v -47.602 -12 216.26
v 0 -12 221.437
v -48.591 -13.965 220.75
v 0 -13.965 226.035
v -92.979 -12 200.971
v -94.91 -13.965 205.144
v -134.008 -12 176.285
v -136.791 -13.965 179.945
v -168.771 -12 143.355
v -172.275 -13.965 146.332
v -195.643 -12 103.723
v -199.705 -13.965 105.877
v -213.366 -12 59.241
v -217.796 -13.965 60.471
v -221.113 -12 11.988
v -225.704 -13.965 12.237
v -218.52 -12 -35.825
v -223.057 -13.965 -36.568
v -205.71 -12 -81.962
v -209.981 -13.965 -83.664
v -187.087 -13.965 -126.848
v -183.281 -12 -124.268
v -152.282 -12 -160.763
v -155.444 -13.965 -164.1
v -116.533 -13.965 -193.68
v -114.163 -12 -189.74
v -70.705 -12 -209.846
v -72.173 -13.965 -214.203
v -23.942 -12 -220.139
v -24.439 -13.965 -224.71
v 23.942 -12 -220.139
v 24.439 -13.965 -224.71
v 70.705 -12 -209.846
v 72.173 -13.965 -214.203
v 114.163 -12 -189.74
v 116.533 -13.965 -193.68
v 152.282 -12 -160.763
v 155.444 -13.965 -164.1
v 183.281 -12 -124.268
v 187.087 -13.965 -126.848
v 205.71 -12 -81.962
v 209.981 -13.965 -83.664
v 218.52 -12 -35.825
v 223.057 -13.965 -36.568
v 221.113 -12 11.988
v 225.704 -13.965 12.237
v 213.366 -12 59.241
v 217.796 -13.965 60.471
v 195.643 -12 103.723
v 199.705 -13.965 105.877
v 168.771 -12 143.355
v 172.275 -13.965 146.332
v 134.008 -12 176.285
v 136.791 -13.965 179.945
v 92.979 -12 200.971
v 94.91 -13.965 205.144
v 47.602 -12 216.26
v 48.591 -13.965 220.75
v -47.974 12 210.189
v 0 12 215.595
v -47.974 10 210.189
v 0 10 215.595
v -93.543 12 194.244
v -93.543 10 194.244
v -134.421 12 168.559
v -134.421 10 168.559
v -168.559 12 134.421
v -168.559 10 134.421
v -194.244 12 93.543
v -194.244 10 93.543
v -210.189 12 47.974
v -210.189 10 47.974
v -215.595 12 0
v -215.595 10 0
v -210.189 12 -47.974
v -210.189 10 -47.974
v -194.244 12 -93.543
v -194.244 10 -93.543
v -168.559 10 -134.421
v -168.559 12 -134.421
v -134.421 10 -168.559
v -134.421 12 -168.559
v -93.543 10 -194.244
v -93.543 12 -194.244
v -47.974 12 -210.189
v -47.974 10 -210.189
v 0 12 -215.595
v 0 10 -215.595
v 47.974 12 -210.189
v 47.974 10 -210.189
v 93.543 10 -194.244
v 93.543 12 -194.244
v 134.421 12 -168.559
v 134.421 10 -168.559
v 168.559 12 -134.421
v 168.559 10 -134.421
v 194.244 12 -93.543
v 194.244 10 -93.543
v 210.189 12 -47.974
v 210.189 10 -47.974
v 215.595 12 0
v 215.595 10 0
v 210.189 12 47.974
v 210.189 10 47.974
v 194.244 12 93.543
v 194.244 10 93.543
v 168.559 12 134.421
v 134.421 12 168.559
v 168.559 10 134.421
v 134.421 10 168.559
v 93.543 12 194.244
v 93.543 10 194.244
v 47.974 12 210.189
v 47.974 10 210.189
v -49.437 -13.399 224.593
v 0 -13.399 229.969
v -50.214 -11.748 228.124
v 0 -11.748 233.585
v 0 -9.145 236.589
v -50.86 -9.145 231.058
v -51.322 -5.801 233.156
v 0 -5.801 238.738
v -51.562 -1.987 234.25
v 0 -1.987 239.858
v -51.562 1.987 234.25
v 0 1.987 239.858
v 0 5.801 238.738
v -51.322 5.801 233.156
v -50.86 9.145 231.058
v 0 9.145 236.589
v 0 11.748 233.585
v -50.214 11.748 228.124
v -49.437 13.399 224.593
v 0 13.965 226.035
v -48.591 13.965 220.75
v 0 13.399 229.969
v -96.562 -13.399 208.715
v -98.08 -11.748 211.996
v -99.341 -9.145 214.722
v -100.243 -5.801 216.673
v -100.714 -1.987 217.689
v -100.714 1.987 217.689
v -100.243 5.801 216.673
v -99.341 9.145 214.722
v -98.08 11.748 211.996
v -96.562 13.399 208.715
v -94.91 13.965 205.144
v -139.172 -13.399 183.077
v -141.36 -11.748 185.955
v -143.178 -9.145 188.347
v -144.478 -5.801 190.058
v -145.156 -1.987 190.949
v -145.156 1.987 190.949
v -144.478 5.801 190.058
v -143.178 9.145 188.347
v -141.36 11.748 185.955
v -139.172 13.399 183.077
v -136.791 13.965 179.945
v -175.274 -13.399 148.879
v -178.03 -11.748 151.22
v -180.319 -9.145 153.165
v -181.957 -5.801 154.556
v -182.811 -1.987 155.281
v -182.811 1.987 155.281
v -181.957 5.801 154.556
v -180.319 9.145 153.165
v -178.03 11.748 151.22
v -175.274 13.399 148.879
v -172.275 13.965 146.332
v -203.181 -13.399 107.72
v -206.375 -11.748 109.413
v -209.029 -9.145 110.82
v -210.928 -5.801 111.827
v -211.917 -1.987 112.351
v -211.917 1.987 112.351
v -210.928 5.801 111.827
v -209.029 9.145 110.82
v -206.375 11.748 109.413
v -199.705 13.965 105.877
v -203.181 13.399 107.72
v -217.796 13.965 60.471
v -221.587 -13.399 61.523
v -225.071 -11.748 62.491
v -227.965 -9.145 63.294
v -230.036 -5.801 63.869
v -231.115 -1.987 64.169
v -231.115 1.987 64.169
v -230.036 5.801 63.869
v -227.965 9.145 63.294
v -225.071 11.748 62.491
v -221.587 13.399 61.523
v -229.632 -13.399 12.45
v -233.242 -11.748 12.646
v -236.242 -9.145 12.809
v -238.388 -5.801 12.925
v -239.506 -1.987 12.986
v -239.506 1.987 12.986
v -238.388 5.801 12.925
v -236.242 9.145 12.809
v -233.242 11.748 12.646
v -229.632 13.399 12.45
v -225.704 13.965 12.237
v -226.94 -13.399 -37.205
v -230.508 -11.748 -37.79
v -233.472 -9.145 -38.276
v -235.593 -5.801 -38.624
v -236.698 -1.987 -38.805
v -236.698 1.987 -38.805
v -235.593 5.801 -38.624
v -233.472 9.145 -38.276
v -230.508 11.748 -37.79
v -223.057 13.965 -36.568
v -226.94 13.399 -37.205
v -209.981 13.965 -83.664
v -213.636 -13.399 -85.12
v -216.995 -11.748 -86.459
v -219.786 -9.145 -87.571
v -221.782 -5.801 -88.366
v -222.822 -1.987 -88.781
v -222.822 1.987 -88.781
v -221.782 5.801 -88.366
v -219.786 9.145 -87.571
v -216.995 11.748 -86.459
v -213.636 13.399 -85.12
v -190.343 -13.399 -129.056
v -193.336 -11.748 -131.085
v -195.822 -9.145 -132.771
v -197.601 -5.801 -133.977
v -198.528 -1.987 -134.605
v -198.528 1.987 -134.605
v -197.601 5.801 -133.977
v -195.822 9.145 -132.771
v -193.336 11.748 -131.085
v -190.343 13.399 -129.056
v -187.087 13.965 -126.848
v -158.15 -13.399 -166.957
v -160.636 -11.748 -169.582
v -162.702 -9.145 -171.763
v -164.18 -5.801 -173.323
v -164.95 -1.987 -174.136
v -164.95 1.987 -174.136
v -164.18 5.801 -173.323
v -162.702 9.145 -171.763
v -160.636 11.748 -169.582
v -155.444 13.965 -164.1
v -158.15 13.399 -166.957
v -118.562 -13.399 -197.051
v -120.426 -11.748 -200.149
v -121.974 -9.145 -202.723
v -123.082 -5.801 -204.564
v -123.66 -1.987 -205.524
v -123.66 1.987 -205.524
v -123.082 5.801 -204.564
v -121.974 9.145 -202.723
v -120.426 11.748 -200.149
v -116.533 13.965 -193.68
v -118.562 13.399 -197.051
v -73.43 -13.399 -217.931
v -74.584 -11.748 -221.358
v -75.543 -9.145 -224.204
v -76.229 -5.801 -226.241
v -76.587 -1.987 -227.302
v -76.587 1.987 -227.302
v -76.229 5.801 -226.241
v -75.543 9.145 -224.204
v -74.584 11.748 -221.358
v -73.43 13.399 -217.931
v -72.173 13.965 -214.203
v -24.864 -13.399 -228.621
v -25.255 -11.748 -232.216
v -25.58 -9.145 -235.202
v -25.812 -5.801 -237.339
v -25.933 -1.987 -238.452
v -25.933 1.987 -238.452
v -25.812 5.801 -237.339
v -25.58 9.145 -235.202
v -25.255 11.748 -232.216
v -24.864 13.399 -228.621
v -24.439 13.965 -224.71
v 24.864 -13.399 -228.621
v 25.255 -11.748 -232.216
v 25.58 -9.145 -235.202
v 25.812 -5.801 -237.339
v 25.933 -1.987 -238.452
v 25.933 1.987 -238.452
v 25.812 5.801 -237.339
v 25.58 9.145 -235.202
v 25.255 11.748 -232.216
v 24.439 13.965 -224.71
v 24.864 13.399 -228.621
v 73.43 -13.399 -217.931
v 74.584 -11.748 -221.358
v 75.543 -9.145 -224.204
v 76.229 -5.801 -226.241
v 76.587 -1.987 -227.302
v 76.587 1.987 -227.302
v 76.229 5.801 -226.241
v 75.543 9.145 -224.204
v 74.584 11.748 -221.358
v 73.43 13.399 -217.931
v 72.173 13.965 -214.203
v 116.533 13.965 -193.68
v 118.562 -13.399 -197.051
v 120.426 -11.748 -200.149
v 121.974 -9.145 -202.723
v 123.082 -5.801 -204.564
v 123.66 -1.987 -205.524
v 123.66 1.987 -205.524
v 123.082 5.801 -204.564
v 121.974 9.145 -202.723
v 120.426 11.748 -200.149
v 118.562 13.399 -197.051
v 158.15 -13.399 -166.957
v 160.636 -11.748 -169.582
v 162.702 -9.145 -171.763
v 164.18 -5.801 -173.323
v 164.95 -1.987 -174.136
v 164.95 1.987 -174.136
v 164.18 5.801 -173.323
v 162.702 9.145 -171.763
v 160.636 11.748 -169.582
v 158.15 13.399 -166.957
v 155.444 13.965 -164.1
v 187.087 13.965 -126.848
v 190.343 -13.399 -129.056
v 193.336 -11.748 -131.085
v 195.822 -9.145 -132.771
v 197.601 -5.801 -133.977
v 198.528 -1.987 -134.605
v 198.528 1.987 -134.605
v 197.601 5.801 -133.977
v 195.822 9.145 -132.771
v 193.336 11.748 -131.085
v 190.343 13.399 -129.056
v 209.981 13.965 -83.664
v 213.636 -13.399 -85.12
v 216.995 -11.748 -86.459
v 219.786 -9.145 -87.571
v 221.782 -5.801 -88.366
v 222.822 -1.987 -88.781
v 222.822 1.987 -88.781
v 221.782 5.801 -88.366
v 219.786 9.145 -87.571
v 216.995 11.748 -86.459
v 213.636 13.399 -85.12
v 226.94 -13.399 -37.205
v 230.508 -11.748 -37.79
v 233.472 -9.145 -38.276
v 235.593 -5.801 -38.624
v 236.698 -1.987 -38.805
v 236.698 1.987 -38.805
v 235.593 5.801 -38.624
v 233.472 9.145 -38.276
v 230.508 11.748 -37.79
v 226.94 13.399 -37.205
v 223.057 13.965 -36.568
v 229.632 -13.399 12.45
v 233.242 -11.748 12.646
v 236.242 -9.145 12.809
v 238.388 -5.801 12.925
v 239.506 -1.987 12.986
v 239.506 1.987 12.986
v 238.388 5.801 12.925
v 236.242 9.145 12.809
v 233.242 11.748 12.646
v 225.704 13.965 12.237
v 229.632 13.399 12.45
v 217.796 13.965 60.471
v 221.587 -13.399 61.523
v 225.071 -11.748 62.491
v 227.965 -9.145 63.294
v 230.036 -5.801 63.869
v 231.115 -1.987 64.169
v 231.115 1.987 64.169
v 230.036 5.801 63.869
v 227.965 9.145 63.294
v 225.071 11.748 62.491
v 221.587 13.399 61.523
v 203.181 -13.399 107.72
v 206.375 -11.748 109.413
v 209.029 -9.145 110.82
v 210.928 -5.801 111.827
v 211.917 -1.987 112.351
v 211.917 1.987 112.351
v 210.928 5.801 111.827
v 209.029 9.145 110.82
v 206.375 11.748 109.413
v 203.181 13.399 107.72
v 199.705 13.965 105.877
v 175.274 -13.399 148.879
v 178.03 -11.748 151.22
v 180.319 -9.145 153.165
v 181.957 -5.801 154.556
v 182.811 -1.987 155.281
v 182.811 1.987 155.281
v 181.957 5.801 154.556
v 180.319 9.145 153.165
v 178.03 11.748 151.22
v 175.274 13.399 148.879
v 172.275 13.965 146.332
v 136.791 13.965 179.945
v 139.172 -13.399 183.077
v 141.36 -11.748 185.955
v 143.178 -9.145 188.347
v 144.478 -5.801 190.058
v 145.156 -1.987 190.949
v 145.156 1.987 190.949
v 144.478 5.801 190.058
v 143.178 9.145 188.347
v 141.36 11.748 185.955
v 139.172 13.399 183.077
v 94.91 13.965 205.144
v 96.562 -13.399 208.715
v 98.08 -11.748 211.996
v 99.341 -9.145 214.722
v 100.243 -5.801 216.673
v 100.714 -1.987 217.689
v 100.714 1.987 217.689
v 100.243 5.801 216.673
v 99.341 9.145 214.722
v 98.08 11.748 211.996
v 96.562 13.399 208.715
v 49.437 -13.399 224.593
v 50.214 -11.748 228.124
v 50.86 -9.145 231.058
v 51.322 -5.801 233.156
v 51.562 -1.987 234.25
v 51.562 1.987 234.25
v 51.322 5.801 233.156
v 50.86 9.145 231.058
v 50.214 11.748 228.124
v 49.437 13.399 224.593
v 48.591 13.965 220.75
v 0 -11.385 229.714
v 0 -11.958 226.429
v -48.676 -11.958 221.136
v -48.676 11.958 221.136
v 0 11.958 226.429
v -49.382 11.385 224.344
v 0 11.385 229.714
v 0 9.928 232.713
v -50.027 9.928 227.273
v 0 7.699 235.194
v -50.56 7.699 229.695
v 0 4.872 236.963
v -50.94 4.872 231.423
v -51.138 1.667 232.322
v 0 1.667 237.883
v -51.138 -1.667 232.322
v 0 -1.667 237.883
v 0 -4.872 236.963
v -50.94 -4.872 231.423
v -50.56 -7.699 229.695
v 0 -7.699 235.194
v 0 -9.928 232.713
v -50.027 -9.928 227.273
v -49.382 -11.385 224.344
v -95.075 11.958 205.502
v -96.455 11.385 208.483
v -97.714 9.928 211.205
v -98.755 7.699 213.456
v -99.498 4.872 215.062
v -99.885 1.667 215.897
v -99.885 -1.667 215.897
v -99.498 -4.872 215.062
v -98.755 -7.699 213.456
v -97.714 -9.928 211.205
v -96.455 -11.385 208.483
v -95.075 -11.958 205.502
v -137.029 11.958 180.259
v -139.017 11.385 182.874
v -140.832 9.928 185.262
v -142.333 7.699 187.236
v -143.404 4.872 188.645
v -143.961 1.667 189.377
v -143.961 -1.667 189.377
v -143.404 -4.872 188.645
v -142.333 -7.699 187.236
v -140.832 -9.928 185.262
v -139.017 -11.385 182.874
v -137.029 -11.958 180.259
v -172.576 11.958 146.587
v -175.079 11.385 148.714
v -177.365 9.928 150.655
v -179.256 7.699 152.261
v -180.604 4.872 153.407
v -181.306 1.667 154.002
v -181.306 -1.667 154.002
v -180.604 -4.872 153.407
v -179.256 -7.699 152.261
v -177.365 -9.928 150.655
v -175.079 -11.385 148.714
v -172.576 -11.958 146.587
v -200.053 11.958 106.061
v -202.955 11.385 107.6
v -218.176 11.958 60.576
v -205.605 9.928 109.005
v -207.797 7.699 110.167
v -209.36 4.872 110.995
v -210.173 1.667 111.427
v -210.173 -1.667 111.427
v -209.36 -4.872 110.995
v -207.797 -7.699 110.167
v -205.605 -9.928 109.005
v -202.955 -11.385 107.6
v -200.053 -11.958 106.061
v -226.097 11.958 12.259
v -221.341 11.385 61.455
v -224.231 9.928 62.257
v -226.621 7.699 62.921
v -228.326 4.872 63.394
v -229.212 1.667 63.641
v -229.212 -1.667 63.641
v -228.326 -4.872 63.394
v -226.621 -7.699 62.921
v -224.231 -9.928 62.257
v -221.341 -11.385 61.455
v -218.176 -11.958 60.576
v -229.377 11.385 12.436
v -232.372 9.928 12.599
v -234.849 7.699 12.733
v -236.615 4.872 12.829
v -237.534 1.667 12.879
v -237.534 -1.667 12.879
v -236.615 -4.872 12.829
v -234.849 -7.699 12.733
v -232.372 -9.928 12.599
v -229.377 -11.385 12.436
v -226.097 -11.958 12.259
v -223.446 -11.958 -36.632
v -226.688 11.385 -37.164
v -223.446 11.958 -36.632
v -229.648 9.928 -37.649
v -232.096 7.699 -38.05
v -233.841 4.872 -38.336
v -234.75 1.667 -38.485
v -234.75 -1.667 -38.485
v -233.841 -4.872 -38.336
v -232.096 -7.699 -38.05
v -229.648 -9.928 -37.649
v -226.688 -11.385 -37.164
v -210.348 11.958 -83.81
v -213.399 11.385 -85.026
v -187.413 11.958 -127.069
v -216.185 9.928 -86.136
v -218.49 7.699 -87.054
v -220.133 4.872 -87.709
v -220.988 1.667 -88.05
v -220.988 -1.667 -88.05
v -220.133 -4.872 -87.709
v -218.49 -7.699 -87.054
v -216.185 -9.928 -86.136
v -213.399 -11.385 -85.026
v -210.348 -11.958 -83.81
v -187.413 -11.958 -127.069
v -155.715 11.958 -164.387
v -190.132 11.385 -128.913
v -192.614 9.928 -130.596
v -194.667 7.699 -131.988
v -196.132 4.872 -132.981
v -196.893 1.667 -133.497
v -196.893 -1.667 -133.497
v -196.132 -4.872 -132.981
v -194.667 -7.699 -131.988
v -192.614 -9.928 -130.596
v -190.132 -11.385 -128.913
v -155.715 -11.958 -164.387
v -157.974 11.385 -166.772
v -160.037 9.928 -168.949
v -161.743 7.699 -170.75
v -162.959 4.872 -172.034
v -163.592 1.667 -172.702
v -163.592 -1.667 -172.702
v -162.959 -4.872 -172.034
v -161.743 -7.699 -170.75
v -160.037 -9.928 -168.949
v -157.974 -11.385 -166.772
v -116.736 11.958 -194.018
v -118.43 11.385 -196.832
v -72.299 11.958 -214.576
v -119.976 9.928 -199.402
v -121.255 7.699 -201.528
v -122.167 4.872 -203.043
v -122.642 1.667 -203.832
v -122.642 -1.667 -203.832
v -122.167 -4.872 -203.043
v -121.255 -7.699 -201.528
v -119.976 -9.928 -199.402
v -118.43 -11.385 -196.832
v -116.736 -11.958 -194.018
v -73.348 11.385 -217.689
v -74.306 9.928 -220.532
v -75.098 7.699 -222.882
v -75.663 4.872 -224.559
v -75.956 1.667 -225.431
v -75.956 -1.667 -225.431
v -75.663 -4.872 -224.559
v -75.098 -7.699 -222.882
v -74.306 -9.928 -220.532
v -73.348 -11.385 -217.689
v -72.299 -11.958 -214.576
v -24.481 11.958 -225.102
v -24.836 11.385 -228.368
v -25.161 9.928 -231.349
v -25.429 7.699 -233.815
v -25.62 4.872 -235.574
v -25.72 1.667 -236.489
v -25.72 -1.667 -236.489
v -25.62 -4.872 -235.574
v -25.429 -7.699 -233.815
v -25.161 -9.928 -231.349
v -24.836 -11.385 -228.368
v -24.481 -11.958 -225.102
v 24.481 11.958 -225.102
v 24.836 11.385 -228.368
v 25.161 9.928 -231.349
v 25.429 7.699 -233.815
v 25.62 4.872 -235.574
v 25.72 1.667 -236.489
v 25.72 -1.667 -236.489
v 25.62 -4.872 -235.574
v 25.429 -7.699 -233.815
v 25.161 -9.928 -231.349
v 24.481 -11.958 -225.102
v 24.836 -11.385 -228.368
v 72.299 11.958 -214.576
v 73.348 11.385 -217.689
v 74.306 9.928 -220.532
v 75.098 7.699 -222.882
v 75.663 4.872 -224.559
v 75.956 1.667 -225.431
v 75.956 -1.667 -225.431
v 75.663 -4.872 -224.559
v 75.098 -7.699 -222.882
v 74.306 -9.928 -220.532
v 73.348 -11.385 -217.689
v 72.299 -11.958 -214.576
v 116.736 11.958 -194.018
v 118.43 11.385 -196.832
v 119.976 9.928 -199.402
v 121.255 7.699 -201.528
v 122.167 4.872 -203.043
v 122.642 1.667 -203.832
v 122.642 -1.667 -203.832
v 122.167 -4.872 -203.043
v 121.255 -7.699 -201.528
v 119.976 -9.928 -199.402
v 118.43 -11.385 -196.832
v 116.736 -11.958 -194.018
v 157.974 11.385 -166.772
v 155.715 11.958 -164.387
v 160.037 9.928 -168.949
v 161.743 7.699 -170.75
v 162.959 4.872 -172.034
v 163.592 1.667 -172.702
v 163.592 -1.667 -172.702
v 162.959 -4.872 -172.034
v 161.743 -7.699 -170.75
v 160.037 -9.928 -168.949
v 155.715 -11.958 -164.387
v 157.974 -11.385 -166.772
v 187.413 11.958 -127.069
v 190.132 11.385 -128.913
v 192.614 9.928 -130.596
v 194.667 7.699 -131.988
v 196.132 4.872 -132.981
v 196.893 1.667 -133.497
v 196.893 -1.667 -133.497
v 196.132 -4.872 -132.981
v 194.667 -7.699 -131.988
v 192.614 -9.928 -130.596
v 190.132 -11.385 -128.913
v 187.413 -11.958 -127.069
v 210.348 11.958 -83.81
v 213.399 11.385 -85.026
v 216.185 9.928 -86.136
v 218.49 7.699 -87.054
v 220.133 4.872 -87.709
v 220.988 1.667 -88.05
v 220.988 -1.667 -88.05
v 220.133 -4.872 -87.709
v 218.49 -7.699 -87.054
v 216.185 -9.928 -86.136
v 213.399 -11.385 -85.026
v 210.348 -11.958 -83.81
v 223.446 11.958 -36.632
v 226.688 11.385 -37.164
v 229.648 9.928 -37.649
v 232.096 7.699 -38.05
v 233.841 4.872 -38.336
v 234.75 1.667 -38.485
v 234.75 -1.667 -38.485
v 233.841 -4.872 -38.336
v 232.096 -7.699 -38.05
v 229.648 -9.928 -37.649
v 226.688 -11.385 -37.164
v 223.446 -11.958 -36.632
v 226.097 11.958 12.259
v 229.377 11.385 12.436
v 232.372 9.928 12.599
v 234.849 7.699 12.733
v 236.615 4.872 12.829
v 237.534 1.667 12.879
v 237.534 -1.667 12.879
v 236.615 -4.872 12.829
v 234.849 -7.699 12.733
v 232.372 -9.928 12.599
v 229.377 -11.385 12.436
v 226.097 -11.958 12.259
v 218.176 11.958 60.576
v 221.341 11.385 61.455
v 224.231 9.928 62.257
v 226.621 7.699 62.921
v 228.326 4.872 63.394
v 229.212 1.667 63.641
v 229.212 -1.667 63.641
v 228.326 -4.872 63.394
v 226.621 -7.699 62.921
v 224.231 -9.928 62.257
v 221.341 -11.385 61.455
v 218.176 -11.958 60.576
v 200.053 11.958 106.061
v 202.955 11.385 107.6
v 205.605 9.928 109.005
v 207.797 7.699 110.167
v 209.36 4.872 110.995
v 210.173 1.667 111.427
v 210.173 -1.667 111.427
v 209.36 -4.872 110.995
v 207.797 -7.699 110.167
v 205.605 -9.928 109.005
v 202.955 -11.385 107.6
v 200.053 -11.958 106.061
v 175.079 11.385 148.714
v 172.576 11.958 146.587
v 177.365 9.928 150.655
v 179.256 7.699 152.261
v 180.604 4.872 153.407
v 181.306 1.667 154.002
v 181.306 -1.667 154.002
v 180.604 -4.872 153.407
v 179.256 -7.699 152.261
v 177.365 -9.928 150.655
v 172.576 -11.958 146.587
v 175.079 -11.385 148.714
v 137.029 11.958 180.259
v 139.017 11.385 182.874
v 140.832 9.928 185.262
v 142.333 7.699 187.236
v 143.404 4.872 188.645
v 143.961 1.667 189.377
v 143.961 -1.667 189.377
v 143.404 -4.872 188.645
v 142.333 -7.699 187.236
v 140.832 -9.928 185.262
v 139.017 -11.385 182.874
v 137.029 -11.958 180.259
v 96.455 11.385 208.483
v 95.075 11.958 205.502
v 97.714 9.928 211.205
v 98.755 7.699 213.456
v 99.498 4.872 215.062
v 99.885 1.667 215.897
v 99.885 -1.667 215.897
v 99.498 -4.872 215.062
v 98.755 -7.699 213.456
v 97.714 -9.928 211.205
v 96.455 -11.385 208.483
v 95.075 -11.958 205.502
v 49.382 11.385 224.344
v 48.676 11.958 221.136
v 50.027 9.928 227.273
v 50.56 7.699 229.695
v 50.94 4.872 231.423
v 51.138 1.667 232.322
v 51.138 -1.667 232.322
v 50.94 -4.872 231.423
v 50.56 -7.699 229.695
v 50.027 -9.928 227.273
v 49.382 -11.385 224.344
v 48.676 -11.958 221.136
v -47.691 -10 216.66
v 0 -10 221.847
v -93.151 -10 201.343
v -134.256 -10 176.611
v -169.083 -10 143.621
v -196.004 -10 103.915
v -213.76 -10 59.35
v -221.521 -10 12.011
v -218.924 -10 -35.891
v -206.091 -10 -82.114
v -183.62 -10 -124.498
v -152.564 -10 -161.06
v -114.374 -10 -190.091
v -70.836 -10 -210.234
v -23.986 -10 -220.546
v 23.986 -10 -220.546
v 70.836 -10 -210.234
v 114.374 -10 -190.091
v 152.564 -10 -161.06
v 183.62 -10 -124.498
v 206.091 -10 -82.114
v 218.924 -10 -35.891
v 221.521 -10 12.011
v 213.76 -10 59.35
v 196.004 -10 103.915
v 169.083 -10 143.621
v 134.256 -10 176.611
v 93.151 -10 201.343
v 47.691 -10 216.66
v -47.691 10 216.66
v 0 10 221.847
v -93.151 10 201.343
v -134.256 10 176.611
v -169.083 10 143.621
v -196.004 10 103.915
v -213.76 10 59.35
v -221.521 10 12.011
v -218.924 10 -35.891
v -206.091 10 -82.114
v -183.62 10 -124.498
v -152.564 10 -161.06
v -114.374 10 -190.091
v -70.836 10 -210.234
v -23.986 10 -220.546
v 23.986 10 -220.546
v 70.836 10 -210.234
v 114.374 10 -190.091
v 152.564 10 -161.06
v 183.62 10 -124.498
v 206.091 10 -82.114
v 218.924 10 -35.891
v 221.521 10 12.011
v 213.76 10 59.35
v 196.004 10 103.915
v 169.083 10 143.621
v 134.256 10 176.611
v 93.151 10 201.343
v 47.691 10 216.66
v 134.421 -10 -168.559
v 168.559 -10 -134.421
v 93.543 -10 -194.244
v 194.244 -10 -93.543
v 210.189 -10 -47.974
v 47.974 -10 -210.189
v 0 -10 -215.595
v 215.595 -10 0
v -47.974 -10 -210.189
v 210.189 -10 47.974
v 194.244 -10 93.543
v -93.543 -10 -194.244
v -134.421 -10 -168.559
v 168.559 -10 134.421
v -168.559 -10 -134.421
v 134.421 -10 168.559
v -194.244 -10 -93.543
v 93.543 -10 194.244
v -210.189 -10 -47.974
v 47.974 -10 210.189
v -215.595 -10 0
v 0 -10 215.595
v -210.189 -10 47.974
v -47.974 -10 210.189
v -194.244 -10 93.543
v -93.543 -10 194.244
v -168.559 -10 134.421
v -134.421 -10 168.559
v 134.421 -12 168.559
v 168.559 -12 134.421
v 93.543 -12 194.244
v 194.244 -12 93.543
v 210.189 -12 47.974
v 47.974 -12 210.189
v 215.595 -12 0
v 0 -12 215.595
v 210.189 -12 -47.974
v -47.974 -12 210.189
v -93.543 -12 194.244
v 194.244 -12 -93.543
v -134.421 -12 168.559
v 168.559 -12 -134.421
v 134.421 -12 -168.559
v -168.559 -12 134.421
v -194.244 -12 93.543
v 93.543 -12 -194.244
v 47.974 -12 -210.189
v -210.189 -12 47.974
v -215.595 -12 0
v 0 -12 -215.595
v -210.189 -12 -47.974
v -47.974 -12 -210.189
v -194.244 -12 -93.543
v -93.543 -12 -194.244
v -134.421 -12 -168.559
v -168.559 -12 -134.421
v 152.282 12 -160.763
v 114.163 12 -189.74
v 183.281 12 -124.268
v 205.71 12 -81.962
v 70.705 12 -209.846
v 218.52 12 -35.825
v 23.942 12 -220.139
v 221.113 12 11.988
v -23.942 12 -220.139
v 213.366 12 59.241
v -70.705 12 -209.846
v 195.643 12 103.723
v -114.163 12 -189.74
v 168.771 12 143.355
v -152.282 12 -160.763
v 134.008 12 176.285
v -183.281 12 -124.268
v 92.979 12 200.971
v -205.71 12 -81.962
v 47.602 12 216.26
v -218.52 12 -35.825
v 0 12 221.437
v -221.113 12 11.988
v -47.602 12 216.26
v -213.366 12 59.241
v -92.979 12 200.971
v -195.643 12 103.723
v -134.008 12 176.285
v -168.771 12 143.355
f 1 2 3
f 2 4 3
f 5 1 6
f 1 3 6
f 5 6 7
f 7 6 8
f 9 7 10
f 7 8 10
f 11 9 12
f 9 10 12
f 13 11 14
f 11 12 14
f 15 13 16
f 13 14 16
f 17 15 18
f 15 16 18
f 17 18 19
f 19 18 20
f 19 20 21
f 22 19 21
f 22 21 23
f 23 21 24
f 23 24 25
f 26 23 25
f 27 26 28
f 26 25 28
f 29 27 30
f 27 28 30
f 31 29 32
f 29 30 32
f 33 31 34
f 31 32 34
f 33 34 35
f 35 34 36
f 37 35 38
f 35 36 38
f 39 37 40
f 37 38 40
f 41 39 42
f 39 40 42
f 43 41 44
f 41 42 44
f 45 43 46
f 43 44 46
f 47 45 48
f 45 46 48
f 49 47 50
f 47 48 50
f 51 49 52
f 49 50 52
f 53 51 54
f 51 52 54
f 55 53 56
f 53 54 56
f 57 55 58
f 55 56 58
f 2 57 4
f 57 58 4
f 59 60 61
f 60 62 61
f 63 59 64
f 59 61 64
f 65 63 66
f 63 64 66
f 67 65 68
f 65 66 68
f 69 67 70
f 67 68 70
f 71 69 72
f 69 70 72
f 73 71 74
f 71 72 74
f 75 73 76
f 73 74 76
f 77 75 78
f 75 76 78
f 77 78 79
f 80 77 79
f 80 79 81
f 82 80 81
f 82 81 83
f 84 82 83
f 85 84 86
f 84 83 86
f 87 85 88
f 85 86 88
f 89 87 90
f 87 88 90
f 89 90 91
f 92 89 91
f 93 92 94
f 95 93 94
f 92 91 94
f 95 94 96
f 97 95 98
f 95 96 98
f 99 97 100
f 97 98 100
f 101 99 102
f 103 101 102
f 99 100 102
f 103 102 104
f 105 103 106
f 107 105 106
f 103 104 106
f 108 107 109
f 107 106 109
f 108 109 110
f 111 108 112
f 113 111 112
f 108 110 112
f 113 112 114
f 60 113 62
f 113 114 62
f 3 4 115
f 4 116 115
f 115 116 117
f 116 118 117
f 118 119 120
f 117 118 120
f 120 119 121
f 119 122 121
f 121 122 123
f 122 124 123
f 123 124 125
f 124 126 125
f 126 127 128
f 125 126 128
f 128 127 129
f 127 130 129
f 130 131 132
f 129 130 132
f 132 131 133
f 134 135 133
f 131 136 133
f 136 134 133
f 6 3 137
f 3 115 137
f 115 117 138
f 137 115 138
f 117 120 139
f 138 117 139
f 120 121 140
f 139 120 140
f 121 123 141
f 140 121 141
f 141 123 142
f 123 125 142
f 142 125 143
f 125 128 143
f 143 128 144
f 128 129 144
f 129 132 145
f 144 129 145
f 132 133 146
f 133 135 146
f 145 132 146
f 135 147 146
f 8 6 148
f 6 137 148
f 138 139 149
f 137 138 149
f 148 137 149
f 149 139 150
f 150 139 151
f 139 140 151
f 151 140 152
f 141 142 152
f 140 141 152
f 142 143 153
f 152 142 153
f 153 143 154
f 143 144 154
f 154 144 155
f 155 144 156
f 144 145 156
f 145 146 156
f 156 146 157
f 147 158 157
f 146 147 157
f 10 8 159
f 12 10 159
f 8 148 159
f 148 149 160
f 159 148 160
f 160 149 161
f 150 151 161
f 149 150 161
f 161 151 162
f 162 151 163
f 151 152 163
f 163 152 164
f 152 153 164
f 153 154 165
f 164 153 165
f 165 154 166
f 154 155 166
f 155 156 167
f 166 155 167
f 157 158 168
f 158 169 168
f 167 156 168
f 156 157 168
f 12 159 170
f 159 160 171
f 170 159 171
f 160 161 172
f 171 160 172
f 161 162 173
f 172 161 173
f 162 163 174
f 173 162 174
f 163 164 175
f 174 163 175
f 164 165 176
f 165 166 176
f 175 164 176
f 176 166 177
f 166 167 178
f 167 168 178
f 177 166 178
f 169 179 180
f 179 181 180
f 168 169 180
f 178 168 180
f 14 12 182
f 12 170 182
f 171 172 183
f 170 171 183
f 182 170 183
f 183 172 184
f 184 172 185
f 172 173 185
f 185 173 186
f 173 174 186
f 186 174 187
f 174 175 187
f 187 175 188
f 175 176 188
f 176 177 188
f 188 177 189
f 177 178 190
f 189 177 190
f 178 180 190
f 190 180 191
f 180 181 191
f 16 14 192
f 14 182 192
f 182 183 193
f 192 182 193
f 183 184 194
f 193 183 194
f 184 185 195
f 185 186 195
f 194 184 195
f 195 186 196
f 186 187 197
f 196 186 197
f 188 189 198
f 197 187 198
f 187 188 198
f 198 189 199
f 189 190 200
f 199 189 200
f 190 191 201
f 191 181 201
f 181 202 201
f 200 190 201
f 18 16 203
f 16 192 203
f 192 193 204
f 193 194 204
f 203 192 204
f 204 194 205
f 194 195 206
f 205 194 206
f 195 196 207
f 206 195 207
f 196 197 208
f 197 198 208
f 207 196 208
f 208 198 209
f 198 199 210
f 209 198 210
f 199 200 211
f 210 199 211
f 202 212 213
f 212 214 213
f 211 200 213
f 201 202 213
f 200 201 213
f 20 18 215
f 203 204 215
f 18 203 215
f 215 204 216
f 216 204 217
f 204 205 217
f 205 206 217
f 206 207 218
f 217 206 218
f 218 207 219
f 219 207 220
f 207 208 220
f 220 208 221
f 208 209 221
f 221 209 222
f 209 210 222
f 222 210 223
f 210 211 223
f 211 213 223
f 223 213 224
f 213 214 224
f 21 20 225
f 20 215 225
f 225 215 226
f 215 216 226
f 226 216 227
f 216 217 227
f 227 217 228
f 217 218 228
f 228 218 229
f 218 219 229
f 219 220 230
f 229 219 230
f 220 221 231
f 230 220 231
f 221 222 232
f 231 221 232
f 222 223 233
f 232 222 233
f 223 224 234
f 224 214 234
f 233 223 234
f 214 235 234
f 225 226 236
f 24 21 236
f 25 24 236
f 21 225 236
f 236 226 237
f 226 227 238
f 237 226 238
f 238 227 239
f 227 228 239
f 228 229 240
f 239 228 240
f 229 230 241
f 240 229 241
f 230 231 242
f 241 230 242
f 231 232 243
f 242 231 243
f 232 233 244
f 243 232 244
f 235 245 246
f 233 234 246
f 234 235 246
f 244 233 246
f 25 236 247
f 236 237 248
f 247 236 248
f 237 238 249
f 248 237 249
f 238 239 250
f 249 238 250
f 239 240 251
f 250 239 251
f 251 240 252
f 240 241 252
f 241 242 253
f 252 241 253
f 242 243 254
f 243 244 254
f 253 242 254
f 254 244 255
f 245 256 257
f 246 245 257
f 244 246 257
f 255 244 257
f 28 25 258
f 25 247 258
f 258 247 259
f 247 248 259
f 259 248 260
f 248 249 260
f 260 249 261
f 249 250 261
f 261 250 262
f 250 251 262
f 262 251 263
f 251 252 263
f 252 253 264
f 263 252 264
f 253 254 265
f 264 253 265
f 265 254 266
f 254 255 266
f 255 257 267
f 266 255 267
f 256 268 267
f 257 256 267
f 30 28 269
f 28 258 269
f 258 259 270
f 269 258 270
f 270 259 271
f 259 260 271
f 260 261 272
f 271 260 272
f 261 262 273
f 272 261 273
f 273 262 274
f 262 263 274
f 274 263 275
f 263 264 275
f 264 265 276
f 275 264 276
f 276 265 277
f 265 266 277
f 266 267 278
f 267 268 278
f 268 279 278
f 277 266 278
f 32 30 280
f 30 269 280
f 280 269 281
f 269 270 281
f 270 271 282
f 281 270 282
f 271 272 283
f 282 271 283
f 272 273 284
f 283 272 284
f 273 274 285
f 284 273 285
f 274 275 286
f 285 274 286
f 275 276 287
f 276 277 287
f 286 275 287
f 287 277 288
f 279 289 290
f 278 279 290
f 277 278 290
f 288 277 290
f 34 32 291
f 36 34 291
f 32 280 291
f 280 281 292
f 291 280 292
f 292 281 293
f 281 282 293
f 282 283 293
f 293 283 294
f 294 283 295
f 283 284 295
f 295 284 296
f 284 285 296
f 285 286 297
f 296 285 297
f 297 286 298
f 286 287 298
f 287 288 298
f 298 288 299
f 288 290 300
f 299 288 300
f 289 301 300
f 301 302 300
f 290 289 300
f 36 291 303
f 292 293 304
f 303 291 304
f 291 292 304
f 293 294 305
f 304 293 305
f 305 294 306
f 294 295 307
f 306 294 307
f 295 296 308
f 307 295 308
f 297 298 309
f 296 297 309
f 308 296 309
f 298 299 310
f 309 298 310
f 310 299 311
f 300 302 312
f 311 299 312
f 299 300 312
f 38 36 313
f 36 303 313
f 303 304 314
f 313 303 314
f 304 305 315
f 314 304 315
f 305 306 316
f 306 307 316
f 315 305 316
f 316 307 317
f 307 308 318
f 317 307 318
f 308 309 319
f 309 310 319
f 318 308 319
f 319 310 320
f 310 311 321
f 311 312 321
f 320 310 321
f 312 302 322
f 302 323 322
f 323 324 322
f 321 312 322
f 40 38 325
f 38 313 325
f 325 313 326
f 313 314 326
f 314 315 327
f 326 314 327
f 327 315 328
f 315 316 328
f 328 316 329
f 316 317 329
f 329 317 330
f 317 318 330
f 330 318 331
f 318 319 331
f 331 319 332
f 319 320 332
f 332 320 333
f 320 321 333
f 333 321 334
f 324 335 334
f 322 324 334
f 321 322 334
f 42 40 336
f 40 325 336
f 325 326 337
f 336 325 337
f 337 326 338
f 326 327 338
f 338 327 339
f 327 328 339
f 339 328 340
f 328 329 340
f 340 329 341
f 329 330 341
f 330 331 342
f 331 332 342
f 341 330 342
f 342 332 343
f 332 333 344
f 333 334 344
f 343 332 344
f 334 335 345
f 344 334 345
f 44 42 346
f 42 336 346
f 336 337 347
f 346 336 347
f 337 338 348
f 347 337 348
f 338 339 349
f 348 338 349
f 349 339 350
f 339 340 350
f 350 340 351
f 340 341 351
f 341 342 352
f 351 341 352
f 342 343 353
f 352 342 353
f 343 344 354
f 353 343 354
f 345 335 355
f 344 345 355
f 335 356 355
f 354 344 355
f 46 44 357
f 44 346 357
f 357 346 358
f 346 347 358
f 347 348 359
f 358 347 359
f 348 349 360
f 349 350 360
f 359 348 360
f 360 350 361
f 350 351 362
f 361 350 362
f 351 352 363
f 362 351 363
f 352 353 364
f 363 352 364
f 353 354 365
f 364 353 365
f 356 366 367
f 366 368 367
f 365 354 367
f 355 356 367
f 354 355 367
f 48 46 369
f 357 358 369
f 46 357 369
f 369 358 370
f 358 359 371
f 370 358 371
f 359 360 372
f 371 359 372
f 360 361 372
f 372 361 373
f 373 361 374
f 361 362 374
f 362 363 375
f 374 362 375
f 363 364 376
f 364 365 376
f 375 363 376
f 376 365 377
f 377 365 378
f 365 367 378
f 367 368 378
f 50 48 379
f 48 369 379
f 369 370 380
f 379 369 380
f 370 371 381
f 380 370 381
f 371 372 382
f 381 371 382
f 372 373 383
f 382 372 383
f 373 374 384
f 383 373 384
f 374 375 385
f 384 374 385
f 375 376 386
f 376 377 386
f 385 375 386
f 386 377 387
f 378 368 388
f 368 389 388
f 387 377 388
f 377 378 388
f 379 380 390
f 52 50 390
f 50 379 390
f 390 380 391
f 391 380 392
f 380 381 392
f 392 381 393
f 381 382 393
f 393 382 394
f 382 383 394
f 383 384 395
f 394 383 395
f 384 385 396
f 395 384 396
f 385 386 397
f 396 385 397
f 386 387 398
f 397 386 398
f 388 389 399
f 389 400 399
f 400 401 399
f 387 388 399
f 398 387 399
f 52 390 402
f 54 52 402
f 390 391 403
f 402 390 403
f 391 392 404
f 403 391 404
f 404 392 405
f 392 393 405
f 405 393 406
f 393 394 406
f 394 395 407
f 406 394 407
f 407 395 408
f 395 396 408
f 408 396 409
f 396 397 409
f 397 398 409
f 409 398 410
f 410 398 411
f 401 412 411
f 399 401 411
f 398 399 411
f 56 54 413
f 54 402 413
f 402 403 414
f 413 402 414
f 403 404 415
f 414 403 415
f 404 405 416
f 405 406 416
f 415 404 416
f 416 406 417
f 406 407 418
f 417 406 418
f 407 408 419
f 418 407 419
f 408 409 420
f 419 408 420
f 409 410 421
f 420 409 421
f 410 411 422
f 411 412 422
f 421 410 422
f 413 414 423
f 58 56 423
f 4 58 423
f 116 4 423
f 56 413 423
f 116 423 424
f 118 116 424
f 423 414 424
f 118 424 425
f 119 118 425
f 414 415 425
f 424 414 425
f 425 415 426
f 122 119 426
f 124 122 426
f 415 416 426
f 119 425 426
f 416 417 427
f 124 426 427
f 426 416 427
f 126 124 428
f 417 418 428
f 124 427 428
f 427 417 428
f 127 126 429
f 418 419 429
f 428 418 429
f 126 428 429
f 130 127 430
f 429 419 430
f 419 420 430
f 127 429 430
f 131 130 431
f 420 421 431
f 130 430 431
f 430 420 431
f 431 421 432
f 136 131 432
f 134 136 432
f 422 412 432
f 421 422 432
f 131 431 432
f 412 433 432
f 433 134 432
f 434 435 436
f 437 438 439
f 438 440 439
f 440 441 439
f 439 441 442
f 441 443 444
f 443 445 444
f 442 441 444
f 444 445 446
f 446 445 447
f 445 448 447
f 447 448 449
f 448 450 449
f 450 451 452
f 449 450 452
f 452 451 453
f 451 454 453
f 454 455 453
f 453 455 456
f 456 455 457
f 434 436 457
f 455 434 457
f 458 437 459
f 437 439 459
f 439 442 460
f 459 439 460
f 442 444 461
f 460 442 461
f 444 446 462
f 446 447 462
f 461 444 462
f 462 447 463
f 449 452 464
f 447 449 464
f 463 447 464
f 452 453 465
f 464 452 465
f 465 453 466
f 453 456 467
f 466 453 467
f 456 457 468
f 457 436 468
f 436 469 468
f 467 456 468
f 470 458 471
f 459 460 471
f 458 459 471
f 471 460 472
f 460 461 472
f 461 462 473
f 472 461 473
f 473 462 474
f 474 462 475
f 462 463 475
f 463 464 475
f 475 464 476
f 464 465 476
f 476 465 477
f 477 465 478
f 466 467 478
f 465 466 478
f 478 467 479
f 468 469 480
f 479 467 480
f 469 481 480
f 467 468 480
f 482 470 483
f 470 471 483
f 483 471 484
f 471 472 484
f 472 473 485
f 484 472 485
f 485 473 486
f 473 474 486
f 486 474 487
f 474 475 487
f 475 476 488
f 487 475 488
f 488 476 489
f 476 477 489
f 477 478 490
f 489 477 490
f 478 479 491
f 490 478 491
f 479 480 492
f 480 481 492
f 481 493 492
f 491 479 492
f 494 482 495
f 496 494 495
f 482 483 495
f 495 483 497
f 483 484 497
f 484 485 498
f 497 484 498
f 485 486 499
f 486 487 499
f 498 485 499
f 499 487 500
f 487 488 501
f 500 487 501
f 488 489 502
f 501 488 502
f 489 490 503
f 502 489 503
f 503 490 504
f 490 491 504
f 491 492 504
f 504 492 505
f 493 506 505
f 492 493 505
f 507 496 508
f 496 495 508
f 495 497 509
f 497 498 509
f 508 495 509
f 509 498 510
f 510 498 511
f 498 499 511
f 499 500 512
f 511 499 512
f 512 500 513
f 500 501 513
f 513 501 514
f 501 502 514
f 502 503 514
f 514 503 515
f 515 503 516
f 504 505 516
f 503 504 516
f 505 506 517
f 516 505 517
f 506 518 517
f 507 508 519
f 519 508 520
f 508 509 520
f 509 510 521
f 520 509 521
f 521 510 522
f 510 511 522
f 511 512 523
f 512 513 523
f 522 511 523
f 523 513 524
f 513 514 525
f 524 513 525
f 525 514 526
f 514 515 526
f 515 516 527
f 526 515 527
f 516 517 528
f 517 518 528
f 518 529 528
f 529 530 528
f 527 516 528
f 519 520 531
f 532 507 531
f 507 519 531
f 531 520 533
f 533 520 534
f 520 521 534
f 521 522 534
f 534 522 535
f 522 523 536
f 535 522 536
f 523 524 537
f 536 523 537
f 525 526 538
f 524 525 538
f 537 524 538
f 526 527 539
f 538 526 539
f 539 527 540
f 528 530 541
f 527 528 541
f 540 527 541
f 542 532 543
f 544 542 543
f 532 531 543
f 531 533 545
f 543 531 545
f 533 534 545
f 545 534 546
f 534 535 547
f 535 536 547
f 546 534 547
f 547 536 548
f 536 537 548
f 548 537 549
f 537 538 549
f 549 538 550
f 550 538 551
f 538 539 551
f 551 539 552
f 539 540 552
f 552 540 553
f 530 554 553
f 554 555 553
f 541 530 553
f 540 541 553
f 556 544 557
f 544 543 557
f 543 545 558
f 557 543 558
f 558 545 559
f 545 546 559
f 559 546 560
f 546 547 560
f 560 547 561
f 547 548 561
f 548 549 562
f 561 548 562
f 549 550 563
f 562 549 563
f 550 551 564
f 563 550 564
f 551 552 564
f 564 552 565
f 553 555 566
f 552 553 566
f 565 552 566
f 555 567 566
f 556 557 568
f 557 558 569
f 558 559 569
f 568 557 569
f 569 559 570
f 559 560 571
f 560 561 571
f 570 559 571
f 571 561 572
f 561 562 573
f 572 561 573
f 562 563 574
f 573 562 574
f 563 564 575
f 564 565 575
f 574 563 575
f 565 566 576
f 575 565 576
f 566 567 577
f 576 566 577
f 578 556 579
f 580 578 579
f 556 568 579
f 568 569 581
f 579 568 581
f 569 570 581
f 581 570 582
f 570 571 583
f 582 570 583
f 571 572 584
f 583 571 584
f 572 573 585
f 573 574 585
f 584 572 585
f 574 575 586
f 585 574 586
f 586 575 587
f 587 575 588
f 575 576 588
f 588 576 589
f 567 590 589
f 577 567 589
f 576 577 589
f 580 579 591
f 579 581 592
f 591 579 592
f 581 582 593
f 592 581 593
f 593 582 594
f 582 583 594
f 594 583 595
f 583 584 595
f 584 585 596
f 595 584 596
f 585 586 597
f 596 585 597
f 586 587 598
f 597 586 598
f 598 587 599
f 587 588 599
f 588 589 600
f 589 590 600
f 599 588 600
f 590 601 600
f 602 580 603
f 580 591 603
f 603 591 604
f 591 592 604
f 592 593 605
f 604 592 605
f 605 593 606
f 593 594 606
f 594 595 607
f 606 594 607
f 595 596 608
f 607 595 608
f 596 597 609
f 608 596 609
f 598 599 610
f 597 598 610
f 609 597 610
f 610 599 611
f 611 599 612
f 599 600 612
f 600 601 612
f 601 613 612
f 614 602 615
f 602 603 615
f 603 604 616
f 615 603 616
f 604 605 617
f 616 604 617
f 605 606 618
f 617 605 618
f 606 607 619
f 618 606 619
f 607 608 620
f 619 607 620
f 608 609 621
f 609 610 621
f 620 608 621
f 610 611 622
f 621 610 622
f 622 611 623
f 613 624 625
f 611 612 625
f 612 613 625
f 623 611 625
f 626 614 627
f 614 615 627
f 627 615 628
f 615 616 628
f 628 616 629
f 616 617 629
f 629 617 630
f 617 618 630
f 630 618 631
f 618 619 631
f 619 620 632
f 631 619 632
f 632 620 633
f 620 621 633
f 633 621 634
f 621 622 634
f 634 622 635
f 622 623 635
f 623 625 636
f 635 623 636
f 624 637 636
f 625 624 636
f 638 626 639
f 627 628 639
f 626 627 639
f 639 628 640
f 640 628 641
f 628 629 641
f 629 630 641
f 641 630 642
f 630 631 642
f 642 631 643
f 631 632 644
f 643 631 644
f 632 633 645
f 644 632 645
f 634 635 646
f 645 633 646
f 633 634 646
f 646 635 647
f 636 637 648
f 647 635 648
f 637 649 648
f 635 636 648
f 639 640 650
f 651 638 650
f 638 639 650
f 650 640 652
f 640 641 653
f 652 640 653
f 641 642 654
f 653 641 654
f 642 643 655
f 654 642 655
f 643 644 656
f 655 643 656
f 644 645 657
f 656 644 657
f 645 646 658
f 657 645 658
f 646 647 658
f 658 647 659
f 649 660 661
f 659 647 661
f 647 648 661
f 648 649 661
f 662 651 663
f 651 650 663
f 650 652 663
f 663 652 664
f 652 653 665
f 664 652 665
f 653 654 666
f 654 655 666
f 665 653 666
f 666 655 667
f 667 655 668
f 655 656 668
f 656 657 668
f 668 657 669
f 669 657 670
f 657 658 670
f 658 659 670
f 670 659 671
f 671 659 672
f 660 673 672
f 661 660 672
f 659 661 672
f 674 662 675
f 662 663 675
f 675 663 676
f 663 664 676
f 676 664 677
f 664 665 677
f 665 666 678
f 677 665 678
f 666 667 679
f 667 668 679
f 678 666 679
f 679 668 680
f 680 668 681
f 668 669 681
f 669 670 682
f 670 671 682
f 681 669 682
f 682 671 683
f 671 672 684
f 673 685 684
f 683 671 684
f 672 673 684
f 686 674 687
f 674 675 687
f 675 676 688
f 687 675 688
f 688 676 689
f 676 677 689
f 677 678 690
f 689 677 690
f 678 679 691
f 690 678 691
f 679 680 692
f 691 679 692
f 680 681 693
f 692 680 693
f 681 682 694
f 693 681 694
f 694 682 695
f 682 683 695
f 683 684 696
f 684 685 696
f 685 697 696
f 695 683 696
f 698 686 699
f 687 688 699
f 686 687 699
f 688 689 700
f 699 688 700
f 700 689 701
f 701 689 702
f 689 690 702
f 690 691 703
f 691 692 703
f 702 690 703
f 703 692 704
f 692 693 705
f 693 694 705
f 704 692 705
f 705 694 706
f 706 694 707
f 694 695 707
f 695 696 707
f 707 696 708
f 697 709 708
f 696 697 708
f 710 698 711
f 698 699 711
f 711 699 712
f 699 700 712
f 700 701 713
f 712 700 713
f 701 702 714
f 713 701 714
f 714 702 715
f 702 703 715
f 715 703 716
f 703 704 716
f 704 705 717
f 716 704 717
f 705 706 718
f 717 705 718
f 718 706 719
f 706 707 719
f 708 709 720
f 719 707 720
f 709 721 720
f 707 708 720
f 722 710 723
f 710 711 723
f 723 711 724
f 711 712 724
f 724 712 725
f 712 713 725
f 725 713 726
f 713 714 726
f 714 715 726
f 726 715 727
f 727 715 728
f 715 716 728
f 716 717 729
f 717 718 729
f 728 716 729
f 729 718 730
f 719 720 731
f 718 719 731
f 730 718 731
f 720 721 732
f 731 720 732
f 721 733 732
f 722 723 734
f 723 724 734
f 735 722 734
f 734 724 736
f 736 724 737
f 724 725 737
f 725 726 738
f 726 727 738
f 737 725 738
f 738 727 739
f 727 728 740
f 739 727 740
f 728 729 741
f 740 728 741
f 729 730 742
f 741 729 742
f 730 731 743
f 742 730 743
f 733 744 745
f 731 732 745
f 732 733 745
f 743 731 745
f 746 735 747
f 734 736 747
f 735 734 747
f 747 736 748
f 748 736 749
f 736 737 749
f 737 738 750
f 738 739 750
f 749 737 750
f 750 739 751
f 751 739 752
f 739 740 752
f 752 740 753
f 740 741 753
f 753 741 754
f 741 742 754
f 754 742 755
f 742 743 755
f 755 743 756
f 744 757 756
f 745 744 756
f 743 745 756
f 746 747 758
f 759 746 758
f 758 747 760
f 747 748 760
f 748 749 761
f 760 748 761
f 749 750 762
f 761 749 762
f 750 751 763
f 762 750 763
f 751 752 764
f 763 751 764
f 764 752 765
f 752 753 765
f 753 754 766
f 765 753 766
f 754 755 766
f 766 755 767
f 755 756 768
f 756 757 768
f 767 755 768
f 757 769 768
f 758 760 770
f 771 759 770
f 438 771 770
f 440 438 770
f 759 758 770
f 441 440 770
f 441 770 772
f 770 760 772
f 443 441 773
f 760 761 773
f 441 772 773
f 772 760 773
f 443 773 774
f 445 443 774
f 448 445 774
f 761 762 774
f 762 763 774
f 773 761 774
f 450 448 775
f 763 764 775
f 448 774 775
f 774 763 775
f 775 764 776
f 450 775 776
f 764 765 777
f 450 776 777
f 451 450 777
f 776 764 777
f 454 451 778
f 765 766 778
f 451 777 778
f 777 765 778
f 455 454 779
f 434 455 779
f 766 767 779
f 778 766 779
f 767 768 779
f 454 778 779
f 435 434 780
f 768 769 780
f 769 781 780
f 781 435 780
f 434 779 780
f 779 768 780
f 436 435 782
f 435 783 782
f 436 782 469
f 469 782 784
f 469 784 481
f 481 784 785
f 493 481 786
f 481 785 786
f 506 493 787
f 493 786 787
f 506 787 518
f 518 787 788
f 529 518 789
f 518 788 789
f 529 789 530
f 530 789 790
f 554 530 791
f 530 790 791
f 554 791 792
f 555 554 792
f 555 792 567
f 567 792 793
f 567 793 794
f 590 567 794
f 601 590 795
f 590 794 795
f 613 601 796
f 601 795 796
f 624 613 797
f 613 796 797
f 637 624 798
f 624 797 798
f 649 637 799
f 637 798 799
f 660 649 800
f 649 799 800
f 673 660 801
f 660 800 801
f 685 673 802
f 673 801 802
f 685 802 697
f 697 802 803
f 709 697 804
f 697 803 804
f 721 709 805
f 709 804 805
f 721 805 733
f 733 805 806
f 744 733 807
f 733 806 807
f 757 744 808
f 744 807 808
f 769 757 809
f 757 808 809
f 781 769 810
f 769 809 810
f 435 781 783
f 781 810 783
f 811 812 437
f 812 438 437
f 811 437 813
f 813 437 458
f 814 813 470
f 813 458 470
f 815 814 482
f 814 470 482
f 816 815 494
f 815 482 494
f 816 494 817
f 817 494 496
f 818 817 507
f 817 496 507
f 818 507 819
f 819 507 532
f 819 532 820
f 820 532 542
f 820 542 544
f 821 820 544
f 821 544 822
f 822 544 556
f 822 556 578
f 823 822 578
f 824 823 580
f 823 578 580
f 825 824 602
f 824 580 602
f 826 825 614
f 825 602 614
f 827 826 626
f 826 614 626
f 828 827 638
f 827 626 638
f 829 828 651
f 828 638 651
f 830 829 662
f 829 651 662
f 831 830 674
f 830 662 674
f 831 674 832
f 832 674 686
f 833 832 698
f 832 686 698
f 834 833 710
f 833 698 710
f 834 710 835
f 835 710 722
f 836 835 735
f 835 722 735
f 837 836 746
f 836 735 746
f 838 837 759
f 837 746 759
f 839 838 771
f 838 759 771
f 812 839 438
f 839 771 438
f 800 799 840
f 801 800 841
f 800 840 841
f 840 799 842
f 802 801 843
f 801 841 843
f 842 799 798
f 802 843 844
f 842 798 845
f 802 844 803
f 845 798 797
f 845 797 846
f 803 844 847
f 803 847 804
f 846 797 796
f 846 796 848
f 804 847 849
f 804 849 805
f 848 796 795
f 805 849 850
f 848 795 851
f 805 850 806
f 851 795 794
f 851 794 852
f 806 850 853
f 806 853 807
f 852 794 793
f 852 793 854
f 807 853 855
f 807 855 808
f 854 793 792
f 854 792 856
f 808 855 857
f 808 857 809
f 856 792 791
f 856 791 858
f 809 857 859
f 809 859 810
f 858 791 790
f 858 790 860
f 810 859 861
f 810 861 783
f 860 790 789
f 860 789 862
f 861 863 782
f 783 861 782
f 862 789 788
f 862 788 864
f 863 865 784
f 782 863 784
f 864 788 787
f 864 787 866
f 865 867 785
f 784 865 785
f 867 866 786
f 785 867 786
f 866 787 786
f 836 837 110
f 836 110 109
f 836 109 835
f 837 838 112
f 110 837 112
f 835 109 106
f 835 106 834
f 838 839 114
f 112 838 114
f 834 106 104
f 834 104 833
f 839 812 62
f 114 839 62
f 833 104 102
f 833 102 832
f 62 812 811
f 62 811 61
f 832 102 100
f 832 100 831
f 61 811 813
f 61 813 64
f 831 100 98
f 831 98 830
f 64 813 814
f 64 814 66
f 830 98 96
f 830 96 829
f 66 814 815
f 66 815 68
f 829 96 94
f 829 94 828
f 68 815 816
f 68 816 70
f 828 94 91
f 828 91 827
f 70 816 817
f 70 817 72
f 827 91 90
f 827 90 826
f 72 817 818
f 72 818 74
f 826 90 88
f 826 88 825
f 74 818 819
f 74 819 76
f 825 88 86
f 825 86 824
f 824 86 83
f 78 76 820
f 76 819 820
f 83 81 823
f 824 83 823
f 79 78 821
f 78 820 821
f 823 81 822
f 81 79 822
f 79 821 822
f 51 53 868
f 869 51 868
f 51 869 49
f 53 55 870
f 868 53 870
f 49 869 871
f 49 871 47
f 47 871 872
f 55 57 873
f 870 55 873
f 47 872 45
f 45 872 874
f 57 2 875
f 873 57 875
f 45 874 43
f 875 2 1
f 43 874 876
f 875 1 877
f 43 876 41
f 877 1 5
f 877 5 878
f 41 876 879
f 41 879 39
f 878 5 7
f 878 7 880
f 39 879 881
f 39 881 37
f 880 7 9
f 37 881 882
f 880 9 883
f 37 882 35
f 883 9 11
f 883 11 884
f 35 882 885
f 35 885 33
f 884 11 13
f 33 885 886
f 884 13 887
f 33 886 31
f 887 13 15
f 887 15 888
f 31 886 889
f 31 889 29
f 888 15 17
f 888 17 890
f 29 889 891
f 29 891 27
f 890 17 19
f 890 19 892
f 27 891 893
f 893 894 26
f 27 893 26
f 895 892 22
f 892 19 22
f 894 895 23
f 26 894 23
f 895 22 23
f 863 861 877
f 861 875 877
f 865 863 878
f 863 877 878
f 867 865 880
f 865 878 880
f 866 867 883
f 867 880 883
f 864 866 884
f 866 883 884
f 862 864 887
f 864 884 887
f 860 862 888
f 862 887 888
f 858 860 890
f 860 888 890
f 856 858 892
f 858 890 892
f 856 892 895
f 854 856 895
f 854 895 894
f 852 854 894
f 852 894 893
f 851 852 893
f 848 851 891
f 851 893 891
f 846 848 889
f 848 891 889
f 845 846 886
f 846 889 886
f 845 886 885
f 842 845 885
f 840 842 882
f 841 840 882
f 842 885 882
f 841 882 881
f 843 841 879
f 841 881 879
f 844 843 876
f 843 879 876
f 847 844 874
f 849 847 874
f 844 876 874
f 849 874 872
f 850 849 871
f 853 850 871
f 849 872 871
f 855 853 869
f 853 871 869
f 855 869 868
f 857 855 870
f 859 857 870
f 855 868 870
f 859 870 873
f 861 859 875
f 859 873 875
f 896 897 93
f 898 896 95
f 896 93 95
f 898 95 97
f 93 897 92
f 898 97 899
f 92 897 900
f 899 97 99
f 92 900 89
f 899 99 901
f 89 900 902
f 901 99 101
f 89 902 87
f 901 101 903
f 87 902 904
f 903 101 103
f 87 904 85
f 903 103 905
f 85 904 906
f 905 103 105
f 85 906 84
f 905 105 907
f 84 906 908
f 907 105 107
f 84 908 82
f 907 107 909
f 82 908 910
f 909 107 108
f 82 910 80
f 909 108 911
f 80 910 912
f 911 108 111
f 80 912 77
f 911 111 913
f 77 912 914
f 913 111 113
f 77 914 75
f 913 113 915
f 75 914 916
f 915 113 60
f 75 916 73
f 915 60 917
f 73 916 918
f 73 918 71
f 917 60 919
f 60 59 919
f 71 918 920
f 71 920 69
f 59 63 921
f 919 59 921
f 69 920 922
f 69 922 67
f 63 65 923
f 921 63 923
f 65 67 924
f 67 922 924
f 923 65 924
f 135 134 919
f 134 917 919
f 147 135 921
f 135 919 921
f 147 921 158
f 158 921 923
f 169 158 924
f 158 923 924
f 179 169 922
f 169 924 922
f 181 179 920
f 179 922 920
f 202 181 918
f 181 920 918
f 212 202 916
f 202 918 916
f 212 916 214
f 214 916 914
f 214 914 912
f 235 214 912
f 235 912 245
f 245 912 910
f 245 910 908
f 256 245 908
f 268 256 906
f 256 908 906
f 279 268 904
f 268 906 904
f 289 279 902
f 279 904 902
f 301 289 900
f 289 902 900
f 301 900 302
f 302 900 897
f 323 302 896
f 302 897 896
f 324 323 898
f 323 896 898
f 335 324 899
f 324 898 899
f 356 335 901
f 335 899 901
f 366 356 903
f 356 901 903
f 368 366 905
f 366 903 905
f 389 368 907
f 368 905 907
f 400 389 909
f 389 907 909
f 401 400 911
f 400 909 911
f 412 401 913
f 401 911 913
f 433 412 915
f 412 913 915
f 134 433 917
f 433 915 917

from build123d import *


with BuildPart() as part:
    # Sketch1 → Revolve1 (revolve)
    with BuildSketch(Plane(origin=(0, 0, 0), x_dir=(0, 0, -1), z_dir=(1, 0, 0)), mode=Mode.PRIVATE) as revolve1_sk:
        with BuildLine():
            Line((217.594560556, -10), (215.594560556, -10))
            Line((215.594560556, -10), (215.594560556, -12))
            Line((215.594560556, -12), (221.437329759, -12))
            Line((221.437329759, -12), (226.035038621, -13.964961379))
            ThreePointArc((226.035038621, -13.964961379), (240, 0), (226.035038621, 13.964961379))
            Line((226.035038621, 13.964961379), (221.437329759, 12))
            Line((221.437329759, 12), (215.594560556, 12))
            Line((215.594560556, 12), (215.594560556, 10))
            Line((215.594560556, 10), (217.594560556, 10))
            Line((217.594560556, 10), (221.846794436, 10))
            Line((221.846794436, 10), (226.42930017, 11.958463891))
            ThreePointArc((226.42930017, 11.958463891), (238, 0), (226.42930017, -11.958463891))
            Line((226.42930017, -11.958463891), (221.846794436, -10))
            Line((221.846794436, -10), (217.594560556, -10))
        make_face()
    revolve(revolve1_sk.sketch.rotate(Axis((0, 21.897389464, 0), (0, -1, 0)), 180), axis=Axis((0, 21.897389464, 0), (0, -1, 0)))


solid = part.part
